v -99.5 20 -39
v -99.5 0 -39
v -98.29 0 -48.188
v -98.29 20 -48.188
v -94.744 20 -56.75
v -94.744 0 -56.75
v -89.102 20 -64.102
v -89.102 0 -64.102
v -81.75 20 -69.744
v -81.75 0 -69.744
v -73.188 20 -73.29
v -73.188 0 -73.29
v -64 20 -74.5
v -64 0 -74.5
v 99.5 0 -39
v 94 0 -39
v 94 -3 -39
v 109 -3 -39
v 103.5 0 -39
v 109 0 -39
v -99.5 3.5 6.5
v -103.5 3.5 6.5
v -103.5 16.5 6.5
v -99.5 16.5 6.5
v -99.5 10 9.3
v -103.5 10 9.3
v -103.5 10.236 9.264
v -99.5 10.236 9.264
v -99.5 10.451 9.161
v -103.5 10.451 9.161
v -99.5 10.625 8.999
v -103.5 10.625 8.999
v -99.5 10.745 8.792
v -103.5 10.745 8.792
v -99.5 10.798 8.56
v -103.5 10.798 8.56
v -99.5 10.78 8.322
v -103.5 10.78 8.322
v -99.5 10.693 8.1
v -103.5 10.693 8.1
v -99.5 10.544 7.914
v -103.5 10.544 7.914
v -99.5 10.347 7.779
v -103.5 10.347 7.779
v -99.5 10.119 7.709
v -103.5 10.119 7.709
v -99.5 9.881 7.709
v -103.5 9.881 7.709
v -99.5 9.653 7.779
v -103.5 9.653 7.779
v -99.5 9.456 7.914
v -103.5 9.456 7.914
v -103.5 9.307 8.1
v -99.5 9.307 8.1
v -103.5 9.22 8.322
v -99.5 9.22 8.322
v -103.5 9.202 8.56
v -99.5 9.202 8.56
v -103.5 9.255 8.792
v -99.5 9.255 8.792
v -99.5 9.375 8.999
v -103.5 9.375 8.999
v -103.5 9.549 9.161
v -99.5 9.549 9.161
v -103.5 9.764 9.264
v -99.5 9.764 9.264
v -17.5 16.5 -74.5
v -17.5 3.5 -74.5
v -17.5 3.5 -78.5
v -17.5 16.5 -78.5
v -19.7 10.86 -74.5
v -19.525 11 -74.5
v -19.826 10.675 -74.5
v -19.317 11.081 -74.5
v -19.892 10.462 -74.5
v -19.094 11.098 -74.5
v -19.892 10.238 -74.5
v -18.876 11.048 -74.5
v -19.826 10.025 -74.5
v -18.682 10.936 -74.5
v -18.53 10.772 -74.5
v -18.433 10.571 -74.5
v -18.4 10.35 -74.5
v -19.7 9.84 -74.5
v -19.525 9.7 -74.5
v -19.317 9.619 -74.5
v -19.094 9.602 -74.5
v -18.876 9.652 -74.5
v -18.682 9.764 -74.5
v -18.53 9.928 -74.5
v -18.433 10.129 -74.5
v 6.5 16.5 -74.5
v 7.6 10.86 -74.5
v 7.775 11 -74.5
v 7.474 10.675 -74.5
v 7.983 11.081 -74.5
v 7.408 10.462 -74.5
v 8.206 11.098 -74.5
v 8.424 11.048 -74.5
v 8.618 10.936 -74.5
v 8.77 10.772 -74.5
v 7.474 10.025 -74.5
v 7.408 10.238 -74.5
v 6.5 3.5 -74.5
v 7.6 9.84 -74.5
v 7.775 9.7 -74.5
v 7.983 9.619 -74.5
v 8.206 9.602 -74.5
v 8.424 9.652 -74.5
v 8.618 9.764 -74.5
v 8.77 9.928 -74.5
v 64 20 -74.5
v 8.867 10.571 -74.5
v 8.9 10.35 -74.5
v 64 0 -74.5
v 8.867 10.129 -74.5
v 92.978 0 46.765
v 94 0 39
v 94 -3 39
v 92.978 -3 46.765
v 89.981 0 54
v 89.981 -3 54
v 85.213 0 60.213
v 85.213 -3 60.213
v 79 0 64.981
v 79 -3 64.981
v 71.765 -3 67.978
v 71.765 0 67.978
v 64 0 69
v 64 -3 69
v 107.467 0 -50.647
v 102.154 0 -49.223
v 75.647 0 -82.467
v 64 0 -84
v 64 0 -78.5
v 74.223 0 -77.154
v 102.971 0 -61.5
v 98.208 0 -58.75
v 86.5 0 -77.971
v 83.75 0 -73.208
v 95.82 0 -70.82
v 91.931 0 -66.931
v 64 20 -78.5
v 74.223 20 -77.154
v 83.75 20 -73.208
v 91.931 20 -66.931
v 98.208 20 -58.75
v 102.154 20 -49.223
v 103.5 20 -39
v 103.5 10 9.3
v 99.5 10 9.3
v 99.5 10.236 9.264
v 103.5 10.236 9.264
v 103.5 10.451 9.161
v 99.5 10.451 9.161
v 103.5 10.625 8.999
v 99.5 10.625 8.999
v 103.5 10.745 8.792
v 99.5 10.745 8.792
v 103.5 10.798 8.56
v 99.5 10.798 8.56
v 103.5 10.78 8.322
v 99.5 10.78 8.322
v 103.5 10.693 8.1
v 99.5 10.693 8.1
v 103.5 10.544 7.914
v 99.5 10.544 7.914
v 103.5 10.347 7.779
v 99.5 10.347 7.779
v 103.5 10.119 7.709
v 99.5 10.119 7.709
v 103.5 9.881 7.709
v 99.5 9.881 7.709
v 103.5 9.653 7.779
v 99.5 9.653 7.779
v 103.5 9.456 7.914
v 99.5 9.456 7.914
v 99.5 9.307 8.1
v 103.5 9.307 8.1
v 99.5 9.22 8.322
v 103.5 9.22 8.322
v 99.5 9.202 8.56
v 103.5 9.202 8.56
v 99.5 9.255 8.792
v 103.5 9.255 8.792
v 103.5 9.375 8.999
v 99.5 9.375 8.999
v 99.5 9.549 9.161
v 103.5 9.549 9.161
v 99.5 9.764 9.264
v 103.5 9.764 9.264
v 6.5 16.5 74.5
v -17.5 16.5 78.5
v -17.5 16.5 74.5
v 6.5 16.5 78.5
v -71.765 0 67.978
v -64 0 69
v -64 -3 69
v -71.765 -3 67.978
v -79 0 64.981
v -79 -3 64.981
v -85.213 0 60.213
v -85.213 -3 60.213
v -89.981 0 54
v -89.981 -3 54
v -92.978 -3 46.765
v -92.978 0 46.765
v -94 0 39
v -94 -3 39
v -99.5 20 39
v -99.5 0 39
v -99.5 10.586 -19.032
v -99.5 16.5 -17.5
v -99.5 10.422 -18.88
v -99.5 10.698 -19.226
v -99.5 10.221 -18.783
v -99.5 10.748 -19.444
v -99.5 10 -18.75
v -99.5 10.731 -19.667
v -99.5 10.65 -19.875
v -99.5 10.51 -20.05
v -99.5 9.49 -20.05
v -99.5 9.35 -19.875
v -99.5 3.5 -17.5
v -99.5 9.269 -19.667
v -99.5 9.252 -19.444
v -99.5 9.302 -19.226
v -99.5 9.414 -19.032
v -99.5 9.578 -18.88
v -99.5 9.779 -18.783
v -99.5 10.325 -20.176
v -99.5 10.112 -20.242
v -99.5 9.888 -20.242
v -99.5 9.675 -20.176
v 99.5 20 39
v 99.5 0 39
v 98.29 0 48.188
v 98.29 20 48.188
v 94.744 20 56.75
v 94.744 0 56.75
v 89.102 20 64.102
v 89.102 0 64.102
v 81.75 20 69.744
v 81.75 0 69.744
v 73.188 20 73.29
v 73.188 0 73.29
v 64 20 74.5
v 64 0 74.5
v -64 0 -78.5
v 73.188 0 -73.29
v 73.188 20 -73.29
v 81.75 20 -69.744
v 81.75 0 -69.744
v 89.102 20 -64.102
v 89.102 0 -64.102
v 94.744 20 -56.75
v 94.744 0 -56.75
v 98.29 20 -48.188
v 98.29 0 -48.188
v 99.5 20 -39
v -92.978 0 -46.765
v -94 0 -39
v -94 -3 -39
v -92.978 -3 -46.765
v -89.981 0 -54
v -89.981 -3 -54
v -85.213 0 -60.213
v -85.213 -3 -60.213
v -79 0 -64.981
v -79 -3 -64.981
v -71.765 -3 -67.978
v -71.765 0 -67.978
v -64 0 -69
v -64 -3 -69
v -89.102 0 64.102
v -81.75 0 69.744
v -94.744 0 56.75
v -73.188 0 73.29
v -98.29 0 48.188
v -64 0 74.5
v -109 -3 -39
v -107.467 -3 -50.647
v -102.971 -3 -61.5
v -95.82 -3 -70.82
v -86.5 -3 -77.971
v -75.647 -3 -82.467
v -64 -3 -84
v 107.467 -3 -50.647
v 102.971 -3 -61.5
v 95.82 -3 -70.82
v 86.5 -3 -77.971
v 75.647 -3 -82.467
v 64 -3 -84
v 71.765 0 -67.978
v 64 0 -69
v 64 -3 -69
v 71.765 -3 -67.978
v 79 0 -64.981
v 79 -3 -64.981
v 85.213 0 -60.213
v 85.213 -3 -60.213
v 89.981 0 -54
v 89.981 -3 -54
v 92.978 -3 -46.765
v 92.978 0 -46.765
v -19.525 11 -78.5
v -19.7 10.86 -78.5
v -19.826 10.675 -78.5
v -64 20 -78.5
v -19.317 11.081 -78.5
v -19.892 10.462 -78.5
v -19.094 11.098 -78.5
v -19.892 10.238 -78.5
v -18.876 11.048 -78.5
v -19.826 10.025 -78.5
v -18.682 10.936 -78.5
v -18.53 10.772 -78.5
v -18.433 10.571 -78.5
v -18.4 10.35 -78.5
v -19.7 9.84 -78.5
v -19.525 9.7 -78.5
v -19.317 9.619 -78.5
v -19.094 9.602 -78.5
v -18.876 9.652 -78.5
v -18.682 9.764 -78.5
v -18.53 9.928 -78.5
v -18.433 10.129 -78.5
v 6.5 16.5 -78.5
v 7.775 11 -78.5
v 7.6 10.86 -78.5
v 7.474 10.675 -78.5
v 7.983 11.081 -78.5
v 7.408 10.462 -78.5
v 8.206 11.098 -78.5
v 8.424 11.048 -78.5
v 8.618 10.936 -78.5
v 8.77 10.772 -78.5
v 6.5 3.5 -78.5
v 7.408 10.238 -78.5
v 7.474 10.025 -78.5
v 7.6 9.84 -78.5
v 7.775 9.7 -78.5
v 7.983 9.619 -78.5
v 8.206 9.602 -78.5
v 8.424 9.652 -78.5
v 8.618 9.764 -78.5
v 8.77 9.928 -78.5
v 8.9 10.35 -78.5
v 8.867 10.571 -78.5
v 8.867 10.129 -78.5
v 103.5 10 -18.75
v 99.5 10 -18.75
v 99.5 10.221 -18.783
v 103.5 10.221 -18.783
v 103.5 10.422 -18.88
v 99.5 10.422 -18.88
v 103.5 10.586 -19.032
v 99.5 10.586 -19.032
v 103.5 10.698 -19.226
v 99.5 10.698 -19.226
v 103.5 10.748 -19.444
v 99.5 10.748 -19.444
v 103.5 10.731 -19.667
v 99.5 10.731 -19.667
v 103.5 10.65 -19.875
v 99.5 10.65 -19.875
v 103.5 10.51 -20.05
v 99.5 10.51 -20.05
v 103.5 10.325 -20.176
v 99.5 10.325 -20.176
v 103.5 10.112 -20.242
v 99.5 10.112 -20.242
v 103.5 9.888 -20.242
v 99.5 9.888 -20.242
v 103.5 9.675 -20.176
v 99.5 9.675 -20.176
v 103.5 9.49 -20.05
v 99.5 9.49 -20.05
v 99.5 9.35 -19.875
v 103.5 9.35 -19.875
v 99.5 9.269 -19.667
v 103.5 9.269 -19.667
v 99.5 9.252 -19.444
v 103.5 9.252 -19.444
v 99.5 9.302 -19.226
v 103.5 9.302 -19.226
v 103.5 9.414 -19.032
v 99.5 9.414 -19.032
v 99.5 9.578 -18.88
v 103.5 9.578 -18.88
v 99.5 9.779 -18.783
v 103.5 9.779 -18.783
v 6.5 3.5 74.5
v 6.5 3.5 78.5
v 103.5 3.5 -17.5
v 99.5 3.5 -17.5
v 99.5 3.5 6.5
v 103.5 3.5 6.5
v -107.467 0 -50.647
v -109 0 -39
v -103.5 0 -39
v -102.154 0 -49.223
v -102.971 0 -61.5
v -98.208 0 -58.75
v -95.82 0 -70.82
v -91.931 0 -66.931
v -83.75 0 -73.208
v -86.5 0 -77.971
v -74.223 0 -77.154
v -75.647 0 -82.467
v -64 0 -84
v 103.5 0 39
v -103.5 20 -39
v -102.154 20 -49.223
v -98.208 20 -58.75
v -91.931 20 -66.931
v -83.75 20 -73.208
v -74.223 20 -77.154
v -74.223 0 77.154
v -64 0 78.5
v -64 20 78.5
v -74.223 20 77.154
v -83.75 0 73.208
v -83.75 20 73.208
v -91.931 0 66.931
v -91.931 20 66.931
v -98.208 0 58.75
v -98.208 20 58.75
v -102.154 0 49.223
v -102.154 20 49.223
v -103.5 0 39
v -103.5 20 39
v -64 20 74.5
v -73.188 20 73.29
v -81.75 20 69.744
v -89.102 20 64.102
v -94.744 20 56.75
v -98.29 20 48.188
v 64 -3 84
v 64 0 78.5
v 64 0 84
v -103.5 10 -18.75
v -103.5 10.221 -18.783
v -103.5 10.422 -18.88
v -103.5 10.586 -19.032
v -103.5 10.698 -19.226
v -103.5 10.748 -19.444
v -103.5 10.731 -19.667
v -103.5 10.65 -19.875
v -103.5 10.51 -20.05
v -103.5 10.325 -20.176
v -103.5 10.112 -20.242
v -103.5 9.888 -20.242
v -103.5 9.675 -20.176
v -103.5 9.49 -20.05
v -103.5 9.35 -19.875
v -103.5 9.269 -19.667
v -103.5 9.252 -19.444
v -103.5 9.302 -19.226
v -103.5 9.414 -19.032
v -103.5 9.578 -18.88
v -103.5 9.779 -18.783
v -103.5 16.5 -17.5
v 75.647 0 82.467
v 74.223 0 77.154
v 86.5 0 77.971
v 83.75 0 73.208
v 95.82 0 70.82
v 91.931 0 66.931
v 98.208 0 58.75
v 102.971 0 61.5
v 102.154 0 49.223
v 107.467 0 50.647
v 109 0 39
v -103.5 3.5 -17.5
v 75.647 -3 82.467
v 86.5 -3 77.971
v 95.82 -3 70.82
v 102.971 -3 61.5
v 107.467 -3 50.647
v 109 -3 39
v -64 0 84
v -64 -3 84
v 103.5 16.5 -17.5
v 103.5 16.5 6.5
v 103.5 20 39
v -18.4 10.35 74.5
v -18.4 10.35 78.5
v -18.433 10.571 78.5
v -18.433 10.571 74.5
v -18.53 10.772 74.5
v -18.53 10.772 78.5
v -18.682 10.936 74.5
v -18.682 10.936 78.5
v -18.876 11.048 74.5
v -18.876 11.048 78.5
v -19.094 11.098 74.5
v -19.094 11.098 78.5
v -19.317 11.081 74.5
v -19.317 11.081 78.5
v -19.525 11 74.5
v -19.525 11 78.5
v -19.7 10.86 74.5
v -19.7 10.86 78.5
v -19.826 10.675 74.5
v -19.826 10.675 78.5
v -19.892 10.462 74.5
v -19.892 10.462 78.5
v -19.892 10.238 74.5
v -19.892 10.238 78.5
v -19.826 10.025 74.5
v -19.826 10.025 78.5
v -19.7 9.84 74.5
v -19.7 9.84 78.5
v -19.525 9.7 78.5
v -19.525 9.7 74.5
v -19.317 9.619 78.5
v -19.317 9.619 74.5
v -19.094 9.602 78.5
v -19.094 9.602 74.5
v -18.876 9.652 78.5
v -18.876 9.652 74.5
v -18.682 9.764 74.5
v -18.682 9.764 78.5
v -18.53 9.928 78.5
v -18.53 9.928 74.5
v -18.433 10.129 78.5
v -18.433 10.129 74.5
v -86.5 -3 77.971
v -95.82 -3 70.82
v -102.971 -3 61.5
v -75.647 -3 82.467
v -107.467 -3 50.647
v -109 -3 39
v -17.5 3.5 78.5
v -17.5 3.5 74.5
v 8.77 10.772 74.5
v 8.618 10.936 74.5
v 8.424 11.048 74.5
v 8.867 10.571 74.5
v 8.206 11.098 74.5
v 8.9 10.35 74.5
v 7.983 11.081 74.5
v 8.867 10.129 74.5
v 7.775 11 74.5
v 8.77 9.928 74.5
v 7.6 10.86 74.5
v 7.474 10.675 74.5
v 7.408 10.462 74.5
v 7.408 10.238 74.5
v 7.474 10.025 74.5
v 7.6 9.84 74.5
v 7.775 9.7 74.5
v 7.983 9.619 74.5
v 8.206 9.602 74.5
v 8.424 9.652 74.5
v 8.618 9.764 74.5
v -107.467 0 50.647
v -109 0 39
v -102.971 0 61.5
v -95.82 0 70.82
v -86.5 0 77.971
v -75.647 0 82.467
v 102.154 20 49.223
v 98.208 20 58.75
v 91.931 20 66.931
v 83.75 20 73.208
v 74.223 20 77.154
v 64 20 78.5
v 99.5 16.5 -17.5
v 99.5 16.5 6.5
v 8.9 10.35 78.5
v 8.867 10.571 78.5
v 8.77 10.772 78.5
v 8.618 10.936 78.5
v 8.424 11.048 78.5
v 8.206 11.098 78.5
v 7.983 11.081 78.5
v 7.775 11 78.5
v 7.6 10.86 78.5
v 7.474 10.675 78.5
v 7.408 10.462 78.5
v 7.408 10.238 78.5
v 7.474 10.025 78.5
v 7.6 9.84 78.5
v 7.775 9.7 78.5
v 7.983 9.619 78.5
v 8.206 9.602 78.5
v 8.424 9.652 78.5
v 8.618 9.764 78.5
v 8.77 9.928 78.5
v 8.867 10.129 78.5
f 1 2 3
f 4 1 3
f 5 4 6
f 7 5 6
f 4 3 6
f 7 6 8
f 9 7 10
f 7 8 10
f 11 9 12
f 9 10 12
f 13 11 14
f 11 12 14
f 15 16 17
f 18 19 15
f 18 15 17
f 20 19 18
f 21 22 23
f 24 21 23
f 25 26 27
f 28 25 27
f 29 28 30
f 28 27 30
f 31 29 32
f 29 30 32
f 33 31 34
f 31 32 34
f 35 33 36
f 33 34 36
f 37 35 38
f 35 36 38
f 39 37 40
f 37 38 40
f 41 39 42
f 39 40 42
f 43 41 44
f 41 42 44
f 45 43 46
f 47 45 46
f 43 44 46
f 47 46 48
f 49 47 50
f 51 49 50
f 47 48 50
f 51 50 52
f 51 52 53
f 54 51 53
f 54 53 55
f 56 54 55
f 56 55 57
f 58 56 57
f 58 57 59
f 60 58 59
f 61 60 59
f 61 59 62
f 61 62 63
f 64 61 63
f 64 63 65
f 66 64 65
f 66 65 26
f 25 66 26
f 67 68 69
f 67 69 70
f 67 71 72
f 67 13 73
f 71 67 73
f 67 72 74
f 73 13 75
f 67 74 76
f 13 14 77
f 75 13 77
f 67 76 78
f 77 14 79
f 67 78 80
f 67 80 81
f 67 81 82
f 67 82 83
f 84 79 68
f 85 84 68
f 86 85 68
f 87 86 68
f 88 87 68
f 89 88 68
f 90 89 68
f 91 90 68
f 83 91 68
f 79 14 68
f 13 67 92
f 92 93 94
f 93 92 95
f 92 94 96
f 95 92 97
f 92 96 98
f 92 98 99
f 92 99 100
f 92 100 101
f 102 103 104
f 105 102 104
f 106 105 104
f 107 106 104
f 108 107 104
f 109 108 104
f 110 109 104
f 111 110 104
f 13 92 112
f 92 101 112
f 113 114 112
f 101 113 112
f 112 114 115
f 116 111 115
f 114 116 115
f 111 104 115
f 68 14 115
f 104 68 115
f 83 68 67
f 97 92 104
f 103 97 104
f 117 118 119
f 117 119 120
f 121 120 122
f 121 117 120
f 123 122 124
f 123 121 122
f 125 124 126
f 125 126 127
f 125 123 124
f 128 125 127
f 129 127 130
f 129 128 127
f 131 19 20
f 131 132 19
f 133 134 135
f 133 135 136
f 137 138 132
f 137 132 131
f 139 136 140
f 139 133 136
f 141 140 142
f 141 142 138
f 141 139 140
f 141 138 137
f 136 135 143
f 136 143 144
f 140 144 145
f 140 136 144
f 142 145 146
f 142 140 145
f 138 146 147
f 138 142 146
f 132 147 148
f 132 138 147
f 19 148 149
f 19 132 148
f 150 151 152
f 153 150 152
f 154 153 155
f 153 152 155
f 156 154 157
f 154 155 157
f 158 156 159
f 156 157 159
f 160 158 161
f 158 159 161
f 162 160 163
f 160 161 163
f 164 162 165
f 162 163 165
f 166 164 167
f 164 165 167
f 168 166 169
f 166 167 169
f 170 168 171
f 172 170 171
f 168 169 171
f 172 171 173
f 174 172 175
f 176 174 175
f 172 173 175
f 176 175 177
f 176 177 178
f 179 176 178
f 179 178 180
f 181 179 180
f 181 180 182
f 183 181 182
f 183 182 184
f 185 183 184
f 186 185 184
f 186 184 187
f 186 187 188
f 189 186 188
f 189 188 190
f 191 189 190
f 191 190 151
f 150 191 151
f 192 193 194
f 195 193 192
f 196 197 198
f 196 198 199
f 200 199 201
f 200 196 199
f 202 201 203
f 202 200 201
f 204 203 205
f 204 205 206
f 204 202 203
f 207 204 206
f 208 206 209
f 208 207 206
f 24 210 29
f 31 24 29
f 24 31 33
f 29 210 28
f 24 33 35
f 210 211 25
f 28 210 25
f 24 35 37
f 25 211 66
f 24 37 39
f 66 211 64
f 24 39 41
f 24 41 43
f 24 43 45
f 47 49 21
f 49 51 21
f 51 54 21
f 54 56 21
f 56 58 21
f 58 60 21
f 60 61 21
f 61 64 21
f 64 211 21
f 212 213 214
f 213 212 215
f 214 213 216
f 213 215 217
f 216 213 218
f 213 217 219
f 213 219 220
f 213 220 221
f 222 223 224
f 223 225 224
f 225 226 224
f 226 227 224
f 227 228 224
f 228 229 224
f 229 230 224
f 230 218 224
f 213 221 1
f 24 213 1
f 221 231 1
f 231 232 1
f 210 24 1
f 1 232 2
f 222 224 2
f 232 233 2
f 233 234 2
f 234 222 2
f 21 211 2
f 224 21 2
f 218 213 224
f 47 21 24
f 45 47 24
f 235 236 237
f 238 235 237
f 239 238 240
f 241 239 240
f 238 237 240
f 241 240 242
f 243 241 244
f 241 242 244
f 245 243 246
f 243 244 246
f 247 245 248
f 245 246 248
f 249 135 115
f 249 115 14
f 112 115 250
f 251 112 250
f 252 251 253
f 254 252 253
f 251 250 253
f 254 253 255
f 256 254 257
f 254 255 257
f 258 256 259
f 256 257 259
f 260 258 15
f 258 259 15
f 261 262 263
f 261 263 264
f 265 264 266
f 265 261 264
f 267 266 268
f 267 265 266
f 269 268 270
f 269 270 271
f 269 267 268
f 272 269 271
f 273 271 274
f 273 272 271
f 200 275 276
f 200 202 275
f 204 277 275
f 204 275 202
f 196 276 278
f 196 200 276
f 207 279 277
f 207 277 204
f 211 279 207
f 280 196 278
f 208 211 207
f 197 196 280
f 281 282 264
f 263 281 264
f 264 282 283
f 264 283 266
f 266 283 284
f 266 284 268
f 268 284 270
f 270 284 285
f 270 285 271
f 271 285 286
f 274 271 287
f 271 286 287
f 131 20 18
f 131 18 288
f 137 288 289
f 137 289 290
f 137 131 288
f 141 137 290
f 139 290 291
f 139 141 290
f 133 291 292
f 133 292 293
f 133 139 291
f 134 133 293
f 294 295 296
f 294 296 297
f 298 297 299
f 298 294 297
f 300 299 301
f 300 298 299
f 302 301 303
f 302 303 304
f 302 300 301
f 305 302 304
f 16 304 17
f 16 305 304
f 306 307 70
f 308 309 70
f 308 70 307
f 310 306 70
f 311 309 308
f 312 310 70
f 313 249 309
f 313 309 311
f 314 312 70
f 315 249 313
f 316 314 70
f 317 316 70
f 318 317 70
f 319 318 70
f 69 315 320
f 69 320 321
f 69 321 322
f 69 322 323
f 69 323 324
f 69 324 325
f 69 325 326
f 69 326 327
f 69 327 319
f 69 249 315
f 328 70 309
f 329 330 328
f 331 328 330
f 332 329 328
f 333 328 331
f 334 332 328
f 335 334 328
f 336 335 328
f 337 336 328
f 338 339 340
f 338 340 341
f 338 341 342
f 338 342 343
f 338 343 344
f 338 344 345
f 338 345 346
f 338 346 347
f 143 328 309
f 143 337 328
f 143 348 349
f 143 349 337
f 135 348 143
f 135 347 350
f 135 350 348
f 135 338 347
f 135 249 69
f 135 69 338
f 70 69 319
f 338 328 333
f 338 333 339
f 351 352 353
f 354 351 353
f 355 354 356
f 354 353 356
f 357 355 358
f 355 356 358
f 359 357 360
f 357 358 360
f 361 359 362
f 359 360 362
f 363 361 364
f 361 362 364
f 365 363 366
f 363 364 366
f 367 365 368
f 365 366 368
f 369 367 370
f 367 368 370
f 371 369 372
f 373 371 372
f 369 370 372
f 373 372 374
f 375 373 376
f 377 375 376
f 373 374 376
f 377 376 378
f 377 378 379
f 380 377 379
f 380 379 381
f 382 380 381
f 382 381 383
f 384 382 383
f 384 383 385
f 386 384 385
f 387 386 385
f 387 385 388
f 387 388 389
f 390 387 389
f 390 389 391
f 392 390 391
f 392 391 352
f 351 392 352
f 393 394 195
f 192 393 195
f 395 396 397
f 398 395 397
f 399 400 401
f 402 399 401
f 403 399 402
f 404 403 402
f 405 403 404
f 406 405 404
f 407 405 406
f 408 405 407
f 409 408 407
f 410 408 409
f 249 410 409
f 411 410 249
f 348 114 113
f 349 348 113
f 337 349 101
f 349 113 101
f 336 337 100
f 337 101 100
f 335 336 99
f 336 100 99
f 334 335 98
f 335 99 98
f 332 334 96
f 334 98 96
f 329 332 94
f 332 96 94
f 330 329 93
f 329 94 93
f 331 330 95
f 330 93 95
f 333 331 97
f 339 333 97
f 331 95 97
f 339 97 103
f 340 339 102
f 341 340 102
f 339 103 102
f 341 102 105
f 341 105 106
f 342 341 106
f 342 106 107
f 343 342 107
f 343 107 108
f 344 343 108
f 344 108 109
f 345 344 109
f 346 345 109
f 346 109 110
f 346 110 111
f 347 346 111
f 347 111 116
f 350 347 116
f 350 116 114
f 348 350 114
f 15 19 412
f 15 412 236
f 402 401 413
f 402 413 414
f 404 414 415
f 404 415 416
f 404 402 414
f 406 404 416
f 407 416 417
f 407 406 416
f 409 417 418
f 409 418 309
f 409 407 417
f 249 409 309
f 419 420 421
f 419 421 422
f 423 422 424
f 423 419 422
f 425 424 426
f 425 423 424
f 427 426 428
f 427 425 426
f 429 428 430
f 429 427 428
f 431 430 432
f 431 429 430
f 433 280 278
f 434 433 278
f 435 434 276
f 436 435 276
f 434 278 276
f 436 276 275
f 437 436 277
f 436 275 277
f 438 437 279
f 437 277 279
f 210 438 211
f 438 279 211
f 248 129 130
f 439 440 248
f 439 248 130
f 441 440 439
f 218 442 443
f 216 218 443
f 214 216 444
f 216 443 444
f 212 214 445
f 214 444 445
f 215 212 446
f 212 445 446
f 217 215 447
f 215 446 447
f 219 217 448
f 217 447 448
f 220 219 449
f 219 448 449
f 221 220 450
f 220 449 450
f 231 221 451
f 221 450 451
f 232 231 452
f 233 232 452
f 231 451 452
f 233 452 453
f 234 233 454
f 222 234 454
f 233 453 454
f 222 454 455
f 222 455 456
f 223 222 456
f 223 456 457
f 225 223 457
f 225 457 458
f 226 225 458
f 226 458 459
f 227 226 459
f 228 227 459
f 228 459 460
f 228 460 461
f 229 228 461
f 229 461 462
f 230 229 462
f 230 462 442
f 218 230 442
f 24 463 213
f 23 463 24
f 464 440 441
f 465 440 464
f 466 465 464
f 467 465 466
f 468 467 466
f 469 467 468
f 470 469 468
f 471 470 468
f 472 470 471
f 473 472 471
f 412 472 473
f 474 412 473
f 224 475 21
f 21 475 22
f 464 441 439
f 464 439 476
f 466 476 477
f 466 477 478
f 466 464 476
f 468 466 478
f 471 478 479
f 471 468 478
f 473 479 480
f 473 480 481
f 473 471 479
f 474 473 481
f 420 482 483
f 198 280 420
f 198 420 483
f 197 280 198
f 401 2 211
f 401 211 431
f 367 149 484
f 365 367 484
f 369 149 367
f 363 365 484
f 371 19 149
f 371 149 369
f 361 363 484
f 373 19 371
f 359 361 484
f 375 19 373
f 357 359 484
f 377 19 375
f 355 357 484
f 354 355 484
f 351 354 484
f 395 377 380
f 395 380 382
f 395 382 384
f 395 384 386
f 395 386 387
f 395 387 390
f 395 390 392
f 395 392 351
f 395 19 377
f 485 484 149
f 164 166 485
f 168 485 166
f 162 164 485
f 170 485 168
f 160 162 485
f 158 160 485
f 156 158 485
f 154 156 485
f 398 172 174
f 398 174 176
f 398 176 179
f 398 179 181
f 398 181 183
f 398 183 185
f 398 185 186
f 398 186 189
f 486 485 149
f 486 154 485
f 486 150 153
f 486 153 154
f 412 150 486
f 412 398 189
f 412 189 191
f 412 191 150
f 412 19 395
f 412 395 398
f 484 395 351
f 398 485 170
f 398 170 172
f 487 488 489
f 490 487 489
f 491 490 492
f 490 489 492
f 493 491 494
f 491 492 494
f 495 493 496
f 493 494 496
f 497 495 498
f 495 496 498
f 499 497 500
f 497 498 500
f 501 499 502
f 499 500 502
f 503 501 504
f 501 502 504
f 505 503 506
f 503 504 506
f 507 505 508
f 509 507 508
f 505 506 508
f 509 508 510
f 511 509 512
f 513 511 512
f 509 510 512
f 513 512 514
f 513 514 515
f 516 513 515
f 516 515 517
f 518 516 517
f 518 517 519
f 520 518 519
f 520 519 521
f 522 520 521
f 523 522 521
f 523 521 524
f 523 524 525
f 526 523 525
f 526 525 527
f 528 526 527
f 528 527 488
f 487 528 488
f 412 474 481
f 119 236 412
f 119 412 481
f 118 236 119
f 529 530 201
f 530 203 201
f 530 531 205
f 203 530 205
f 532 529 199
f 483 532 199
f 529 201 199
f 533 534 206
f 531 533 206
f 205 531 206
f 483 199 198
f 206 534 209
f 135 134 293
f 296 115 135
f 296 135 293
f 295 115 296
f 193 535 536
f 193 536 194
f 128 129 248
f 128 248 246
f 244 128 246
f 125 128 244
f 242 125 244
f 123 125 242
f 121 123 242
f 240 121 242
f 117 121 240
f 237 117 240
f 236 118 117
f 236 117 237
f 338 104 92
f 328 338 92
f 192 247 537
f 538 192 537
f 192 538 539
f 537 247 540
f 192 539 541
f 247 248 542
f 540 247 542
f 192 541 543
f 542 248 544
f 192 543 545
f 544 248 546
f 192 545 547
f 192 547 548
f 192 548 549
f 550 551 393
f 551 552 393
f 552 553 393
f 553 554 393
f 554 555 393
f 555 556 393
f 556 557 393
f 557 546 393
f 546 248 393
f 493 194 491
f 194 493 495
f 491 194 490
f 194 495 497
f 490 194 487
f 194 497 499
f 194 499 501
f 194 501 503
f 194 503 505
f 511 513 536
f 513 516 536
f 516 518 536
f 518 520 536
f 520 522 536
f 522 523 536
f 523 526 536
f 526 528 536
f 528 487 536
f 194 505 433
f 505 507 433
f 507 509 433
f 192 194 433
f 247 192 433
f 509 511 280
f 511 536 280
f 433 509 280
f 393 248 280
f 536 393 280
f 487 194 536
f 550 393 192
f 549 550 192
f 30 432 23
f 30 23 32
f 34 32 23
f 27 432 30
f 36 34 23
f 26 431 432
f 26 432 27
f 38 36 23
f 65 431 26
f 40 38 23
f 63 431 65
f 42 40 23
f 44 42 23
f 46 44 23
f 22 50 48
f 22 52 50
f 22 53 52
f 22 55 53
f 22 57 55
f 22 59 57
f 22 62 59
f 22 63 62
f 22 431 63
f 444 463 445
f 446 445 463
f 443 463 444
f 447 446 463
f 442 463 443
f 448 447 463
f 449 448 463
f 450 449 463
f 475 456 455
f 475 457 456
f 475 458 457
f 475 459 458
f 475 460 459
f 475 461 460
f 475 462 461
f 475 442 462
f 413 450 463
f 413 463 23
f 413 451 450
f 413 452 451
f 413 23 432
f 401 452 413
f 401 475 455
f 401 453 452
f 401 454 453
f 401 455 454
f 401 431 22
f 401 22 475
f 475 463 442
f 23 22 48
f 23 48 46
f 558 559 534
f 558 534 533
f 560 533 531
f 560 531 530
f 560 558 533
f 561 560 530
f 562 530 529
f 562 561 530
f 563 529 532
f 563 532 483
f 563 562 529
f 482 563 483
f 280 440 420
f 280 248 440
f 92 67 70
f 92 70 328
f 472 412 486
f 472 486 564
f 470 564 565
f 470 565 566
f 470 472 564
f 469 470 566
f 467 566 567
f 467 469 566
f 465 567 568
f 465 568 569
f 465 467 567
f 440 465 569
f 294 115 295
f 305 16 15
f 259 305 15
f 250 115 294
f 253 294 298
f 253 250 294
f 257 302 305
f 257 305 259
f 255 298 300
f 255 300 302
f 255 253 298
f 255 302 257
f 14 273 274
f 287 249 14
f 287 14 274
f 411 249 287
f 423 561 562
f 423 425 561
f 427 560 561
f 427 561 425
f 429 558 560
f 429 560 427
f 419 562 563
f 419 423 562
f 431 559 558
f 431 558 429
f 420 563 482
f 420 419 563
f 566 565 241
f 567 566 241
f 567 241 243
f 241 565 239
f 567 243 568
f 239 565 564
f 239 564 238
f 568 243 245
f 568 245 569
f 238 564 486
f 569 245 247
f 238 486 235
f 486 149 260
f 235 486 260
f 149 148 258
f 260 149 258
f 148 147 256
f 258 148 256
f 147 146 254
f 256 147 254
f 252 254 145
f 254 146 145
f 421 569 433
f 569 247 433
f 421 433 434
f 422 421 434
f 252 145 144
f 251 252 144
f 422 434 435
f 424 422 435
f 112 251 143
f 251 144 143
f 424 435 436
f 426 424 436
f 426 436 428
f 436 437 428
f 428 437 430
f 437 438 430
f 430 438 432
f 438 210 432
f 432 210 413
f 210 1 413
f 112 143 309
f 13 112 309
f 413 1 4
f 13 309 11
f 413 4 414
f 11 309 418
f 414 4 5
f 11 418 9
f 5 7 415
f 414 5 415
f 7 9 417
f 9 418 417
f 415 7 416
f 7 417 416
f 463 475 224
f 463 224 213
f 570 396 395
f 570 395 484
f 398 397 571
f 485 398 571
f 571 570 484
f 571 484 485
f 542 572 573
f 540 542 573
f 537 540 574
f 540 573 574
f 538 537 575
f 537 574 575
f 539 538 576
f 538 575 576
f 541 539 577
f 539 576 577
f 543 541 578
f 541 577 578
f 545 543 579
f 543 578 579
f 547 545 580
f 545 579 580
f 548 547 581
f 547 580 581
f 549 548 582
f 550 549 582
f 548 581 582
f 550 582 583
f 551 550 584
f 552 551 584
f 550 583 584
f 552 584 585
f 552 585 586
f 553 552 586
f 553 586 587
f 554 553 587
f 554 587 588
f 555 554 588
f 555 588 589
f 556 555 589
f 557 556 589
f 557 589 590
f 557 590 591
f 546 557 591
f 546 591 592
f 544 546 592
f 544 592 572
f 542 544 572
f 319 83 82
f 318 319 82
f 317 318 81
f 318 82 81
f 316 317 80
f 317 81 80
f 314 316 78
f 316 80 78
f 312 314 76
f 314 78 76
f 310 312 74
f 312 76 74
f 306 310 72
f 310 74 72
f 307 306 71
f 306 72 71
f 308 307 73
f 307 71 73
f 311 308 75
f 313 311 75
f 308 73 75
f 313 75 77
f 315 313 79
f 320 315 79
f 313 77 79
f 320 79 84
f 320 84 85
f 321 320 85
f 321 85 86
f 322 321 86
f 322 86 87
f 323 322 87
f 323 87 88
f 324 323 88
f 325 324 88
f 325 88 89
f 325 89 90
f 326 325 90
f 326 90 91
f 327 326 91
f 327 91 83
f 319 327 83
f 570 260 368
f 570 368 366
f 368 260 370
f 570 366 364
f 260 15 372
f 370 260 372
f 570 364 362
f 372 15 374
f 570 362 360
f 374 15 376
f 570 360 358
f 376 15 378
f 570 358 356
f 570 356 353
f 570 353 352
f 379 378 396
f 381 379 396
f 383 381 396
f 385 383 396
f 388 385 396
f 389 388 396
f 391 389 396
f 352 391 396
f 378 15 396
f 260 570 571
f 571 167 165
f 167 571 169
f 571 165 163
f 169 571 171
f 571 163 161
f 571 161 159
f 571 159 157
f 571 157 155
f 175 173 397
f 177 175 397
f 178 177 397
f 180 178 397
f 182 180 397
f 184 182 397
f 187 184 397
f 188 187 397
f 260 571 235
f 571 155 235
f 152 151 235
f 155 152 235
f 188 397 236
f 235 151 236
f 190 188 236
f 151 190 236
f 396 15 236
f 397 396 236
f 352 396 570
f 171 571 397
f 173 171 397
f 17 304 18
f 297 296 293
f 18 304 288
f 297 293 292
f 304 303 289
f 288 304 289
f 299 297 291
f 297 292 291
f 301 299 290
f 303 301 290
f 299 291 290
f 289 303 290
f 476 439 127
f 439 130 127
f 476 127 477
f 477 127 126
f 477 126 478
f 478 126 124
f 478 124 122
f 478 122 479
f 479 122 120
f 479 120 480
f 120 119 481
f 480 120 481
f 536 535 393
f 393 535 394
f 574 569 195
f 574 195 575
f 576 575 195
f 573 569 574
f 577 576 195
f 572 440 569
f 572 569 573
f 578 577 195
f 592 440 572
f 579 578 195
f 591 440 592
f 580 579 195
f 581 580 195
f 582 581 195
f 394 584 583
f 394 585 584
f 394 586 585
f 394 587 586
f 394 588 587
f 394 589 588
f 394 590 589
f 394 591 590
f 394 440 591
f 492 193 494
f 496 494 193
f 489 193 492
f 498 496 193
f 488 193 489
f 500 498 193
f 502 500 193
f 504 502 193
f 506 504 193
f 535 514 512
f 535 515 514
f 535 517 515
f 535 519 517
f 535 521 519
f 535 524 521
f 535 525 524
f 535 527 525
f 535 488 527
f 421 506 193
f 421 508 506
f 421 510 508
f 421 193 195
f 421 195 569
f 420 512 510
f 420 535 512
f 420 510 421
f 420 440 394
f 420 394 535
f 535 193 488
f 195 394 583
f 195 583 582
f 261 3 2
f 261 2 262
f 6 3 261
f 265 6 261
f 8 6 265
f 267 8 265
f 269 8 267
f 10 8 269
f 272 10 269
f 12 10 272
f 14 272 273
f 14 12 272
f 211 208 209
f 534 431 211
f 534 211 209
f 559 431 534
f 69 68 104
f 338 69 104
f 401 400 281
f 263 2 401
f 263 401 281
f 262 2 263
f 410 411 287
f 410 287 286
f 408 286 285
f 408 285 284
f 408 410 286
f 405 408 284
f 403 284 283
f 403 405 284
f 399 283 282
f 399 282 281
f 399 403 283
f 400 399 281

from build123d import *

# Parameters (mm, degrees)
BOSS_EXTRUDE1_DEPTH   = 3
BOSS_EXTRUDE1_2_DEPTH = 3
BOSS_EXTRUDE1_3_DEPTH = 3
BOSS_EXTRUDE1_4_DEPTH = 3
BOSS_EXTRUDE2_DEPTH   = 20
SKETCH3_W             = 24
SKETCH3_H             = 13
SKETCH3_R             = 6
SKETCH3_R_2           = 0.75
SKETCH3_R_3           = 0.8
CUT_EXTRUDE1_DEPTH    = 207
SKETCH4_W             = 24
SKETCH4_H             = 13
SKETCH4_R             = 6
SKETCH4_R_2           = 0.75
CUT_EXTRUDE3_DEPTH    = 157


with BuildPart() as part:
    # Sketch1 → Boss-Extrude1 (new body)
    with BuildSketch(Plane(origin=(0, 0, 0), x_dir=(1, 0, 0), z_dir=(0, 1, 0))):
        with BuildLine():
            ThreePointArc((-64, 84), (-95.819805153, 70.819805153), (-109, 39))
            Line((-109, 39), (-94, 39))
            ThreePointArc((-94, 39), (-85.213203436, 60.213203436), (-64, 69))
            Line((-64, 69), (-64, 84))
        make_face()
    extrude(amount=-BOSS_EXTRUDE1_DEPTH)



with BuildPart() as body_2:
    # Sketch1 → Boss-Extrude1 2 (new body)
    with BuildSketch(Plane(origin=(0, 0, 0), x_dir=(1, 0, 0), z_dir=(0, 1, 0))):
        with BuildLine():
            ThreePointArc((109, 39), (95.819805153, 70.819805153), (64, 84))
            Line((64, 84), (64, 69))
            ThreePointArc((64, 69), (85.213203436, 60.213203436), (94, 39))
            Line((94, 39), (109, 39))
        make_face()
    extrude(amount=-BOSS_EXTRUDE1_2_DEPTH)


with BuildPart() as body_3:
    # Sketch1 → Boss-Extrude1 3 (new body)
    with BuildSketch(Plane(origin=(0, 0, 0), x_dir=(1, 0, 0), z_dir=(0, 1, 0))):
        with BuildLine():
            ThreePointArc((-109, -39), (-95.819805153, -70.819805153), (-64, -84))
            Line((-64, -84), (-64, -69))
            ThreePointArc((-64, -69), (-85.213203436, -60.213203436), (-94, -39))
            Line((-94, -39), (-109, -39))
        make_face()
    extrude(amount=-BOSS_EXTRUDE1_3_DEPTH)


with BuildPart() as body_4:
    # Sketch1 → Boss-Extrude1 4 (new body)
    with BuildSketch(Plane(origin=(0, 0, 0), x_dir=(1, 0, 0), z_dir=(0, 1, 0))):
        with BuildLine():
            ThreePointArc((64, -84), (95.819805153, -70.819805153), (109, -39))
            Line((109, -39), (94, -39))
            ThreePointArc((94, -39), (85.213203436, -60.213203436), (64, -69))
            Line((64, -69), (64, -84))
        make_face()
    extrude(amount=-BOSS_EXTRUDE1_4_DEPTH)


with BuildPart() as part_1:
    add(part.part)

    add(body_2.part)  # Boss-Extrude2 merges body 2

    add(body_3.part)  # Boss-Extrude2 merges body 3

    add(body_4.part)  # Boss-Extrude2 merges body 4
    # Sketch1<6> → Boss-Extrude2 (add)
    with BuildSketch(Plane(origin=(0, 0, 0), x_dir=(1, 0, 0), z_dir=(0, 1, 0))):
        with BuildLine():
            Line((-64, 78.5), (64, 78.5))
            ThreePointArc((64, 78.5), (91.930717857, 66.930717857), (103.5, 39))
            Line((103.5, 39), (103.5, -39))
            ThreePointArc((103.5, -39), (91.930717857, -66.930717857), (64, -78.5))
            Line((64, -78.5), (-64, -78.5))
            ThreePointArc((-64, -78.5), (-91.930717857, -66.930717857), (-103.5, -39))
            Line((-103.5, -39), (-103.5, 39))
            ThreePointArc((-103.5, 39), (-91.930717857, 66.930717857), (-64, 78.5))
        make_face()
        with BuildLine():
            Line((-64, 74.5), (64, 74.5))
            ThreePointArc((64, 74.5), (89.102290732, 64.102290732), (99.5, 39))
            Line((99.5, 39), (99.5, -39))
            ThreePointArc((99.5, -39), (89.102290732, -64.102290732), (64, -74.5))
            Line((64, -74.5), (-64, -74.5))
            ThreePointArc((-64, -74.5), (-89.102290732, -64.102290732), (-99.5, -39))
            Line((-99.5, -39), (-99.5, 39))
            ThreePointArc((-99.5, 39), (-89.102290732, 64.102290732), (-64, 74.5))
        make_face(mode=Mode.SUBTRACT)
    extrude(amount=BOSS_EXTRUDE2_DEPTH)

    # Sketch3 → Cut-Extrude1 (cut)
    with BuildSketch(Plane.ZY.offset(103.5)):
        with Locations((-5.5, 10)):
            Rectangle(SKETCH3_W, SKETCH3_H)
        with Locations((0, 10)):
            Circle(SKETCH3_R, mode=Mode.SUBTRACT)
        with Locations((-19.5, 10)):
            Circle(SKETCH3_R_2)
        with Locations((0, 10)):
            Circle(SKETCH3_R)
        with Locations((8.5, 10)):
            Circle(SKETCH3_R_3)
    extrude(amount=-CUT_EXTRUDE1_DEPTH, mode=Mode.SUBTRACT)

    # Sketch4 → Cut-Extrude3 (cut)
    with BuildSketch(Plane.XY.offset(78.5)):
        with Locations((-5.5, 10)):
            Rectangle(SKETCH4_W, SKETCH4_H)
        with Locations((0, 10)):
            Circle(SKETCH4_R, mode=Mode.SUBTRACT)
        with Locations((-19.15, 10.35)):
            Circle(SKETCH4_R_2)
        with Locations((8.15, 10.35)):
            Circle(SKETCH4_R_2)
        with Locations((0, 10)):
            Circle(SKETCH4_R)
    extrude(amount=-CUT_EXTRUDE3_DEPTH, mode=Mode.SUBTRACT)


solid = part_1.part
